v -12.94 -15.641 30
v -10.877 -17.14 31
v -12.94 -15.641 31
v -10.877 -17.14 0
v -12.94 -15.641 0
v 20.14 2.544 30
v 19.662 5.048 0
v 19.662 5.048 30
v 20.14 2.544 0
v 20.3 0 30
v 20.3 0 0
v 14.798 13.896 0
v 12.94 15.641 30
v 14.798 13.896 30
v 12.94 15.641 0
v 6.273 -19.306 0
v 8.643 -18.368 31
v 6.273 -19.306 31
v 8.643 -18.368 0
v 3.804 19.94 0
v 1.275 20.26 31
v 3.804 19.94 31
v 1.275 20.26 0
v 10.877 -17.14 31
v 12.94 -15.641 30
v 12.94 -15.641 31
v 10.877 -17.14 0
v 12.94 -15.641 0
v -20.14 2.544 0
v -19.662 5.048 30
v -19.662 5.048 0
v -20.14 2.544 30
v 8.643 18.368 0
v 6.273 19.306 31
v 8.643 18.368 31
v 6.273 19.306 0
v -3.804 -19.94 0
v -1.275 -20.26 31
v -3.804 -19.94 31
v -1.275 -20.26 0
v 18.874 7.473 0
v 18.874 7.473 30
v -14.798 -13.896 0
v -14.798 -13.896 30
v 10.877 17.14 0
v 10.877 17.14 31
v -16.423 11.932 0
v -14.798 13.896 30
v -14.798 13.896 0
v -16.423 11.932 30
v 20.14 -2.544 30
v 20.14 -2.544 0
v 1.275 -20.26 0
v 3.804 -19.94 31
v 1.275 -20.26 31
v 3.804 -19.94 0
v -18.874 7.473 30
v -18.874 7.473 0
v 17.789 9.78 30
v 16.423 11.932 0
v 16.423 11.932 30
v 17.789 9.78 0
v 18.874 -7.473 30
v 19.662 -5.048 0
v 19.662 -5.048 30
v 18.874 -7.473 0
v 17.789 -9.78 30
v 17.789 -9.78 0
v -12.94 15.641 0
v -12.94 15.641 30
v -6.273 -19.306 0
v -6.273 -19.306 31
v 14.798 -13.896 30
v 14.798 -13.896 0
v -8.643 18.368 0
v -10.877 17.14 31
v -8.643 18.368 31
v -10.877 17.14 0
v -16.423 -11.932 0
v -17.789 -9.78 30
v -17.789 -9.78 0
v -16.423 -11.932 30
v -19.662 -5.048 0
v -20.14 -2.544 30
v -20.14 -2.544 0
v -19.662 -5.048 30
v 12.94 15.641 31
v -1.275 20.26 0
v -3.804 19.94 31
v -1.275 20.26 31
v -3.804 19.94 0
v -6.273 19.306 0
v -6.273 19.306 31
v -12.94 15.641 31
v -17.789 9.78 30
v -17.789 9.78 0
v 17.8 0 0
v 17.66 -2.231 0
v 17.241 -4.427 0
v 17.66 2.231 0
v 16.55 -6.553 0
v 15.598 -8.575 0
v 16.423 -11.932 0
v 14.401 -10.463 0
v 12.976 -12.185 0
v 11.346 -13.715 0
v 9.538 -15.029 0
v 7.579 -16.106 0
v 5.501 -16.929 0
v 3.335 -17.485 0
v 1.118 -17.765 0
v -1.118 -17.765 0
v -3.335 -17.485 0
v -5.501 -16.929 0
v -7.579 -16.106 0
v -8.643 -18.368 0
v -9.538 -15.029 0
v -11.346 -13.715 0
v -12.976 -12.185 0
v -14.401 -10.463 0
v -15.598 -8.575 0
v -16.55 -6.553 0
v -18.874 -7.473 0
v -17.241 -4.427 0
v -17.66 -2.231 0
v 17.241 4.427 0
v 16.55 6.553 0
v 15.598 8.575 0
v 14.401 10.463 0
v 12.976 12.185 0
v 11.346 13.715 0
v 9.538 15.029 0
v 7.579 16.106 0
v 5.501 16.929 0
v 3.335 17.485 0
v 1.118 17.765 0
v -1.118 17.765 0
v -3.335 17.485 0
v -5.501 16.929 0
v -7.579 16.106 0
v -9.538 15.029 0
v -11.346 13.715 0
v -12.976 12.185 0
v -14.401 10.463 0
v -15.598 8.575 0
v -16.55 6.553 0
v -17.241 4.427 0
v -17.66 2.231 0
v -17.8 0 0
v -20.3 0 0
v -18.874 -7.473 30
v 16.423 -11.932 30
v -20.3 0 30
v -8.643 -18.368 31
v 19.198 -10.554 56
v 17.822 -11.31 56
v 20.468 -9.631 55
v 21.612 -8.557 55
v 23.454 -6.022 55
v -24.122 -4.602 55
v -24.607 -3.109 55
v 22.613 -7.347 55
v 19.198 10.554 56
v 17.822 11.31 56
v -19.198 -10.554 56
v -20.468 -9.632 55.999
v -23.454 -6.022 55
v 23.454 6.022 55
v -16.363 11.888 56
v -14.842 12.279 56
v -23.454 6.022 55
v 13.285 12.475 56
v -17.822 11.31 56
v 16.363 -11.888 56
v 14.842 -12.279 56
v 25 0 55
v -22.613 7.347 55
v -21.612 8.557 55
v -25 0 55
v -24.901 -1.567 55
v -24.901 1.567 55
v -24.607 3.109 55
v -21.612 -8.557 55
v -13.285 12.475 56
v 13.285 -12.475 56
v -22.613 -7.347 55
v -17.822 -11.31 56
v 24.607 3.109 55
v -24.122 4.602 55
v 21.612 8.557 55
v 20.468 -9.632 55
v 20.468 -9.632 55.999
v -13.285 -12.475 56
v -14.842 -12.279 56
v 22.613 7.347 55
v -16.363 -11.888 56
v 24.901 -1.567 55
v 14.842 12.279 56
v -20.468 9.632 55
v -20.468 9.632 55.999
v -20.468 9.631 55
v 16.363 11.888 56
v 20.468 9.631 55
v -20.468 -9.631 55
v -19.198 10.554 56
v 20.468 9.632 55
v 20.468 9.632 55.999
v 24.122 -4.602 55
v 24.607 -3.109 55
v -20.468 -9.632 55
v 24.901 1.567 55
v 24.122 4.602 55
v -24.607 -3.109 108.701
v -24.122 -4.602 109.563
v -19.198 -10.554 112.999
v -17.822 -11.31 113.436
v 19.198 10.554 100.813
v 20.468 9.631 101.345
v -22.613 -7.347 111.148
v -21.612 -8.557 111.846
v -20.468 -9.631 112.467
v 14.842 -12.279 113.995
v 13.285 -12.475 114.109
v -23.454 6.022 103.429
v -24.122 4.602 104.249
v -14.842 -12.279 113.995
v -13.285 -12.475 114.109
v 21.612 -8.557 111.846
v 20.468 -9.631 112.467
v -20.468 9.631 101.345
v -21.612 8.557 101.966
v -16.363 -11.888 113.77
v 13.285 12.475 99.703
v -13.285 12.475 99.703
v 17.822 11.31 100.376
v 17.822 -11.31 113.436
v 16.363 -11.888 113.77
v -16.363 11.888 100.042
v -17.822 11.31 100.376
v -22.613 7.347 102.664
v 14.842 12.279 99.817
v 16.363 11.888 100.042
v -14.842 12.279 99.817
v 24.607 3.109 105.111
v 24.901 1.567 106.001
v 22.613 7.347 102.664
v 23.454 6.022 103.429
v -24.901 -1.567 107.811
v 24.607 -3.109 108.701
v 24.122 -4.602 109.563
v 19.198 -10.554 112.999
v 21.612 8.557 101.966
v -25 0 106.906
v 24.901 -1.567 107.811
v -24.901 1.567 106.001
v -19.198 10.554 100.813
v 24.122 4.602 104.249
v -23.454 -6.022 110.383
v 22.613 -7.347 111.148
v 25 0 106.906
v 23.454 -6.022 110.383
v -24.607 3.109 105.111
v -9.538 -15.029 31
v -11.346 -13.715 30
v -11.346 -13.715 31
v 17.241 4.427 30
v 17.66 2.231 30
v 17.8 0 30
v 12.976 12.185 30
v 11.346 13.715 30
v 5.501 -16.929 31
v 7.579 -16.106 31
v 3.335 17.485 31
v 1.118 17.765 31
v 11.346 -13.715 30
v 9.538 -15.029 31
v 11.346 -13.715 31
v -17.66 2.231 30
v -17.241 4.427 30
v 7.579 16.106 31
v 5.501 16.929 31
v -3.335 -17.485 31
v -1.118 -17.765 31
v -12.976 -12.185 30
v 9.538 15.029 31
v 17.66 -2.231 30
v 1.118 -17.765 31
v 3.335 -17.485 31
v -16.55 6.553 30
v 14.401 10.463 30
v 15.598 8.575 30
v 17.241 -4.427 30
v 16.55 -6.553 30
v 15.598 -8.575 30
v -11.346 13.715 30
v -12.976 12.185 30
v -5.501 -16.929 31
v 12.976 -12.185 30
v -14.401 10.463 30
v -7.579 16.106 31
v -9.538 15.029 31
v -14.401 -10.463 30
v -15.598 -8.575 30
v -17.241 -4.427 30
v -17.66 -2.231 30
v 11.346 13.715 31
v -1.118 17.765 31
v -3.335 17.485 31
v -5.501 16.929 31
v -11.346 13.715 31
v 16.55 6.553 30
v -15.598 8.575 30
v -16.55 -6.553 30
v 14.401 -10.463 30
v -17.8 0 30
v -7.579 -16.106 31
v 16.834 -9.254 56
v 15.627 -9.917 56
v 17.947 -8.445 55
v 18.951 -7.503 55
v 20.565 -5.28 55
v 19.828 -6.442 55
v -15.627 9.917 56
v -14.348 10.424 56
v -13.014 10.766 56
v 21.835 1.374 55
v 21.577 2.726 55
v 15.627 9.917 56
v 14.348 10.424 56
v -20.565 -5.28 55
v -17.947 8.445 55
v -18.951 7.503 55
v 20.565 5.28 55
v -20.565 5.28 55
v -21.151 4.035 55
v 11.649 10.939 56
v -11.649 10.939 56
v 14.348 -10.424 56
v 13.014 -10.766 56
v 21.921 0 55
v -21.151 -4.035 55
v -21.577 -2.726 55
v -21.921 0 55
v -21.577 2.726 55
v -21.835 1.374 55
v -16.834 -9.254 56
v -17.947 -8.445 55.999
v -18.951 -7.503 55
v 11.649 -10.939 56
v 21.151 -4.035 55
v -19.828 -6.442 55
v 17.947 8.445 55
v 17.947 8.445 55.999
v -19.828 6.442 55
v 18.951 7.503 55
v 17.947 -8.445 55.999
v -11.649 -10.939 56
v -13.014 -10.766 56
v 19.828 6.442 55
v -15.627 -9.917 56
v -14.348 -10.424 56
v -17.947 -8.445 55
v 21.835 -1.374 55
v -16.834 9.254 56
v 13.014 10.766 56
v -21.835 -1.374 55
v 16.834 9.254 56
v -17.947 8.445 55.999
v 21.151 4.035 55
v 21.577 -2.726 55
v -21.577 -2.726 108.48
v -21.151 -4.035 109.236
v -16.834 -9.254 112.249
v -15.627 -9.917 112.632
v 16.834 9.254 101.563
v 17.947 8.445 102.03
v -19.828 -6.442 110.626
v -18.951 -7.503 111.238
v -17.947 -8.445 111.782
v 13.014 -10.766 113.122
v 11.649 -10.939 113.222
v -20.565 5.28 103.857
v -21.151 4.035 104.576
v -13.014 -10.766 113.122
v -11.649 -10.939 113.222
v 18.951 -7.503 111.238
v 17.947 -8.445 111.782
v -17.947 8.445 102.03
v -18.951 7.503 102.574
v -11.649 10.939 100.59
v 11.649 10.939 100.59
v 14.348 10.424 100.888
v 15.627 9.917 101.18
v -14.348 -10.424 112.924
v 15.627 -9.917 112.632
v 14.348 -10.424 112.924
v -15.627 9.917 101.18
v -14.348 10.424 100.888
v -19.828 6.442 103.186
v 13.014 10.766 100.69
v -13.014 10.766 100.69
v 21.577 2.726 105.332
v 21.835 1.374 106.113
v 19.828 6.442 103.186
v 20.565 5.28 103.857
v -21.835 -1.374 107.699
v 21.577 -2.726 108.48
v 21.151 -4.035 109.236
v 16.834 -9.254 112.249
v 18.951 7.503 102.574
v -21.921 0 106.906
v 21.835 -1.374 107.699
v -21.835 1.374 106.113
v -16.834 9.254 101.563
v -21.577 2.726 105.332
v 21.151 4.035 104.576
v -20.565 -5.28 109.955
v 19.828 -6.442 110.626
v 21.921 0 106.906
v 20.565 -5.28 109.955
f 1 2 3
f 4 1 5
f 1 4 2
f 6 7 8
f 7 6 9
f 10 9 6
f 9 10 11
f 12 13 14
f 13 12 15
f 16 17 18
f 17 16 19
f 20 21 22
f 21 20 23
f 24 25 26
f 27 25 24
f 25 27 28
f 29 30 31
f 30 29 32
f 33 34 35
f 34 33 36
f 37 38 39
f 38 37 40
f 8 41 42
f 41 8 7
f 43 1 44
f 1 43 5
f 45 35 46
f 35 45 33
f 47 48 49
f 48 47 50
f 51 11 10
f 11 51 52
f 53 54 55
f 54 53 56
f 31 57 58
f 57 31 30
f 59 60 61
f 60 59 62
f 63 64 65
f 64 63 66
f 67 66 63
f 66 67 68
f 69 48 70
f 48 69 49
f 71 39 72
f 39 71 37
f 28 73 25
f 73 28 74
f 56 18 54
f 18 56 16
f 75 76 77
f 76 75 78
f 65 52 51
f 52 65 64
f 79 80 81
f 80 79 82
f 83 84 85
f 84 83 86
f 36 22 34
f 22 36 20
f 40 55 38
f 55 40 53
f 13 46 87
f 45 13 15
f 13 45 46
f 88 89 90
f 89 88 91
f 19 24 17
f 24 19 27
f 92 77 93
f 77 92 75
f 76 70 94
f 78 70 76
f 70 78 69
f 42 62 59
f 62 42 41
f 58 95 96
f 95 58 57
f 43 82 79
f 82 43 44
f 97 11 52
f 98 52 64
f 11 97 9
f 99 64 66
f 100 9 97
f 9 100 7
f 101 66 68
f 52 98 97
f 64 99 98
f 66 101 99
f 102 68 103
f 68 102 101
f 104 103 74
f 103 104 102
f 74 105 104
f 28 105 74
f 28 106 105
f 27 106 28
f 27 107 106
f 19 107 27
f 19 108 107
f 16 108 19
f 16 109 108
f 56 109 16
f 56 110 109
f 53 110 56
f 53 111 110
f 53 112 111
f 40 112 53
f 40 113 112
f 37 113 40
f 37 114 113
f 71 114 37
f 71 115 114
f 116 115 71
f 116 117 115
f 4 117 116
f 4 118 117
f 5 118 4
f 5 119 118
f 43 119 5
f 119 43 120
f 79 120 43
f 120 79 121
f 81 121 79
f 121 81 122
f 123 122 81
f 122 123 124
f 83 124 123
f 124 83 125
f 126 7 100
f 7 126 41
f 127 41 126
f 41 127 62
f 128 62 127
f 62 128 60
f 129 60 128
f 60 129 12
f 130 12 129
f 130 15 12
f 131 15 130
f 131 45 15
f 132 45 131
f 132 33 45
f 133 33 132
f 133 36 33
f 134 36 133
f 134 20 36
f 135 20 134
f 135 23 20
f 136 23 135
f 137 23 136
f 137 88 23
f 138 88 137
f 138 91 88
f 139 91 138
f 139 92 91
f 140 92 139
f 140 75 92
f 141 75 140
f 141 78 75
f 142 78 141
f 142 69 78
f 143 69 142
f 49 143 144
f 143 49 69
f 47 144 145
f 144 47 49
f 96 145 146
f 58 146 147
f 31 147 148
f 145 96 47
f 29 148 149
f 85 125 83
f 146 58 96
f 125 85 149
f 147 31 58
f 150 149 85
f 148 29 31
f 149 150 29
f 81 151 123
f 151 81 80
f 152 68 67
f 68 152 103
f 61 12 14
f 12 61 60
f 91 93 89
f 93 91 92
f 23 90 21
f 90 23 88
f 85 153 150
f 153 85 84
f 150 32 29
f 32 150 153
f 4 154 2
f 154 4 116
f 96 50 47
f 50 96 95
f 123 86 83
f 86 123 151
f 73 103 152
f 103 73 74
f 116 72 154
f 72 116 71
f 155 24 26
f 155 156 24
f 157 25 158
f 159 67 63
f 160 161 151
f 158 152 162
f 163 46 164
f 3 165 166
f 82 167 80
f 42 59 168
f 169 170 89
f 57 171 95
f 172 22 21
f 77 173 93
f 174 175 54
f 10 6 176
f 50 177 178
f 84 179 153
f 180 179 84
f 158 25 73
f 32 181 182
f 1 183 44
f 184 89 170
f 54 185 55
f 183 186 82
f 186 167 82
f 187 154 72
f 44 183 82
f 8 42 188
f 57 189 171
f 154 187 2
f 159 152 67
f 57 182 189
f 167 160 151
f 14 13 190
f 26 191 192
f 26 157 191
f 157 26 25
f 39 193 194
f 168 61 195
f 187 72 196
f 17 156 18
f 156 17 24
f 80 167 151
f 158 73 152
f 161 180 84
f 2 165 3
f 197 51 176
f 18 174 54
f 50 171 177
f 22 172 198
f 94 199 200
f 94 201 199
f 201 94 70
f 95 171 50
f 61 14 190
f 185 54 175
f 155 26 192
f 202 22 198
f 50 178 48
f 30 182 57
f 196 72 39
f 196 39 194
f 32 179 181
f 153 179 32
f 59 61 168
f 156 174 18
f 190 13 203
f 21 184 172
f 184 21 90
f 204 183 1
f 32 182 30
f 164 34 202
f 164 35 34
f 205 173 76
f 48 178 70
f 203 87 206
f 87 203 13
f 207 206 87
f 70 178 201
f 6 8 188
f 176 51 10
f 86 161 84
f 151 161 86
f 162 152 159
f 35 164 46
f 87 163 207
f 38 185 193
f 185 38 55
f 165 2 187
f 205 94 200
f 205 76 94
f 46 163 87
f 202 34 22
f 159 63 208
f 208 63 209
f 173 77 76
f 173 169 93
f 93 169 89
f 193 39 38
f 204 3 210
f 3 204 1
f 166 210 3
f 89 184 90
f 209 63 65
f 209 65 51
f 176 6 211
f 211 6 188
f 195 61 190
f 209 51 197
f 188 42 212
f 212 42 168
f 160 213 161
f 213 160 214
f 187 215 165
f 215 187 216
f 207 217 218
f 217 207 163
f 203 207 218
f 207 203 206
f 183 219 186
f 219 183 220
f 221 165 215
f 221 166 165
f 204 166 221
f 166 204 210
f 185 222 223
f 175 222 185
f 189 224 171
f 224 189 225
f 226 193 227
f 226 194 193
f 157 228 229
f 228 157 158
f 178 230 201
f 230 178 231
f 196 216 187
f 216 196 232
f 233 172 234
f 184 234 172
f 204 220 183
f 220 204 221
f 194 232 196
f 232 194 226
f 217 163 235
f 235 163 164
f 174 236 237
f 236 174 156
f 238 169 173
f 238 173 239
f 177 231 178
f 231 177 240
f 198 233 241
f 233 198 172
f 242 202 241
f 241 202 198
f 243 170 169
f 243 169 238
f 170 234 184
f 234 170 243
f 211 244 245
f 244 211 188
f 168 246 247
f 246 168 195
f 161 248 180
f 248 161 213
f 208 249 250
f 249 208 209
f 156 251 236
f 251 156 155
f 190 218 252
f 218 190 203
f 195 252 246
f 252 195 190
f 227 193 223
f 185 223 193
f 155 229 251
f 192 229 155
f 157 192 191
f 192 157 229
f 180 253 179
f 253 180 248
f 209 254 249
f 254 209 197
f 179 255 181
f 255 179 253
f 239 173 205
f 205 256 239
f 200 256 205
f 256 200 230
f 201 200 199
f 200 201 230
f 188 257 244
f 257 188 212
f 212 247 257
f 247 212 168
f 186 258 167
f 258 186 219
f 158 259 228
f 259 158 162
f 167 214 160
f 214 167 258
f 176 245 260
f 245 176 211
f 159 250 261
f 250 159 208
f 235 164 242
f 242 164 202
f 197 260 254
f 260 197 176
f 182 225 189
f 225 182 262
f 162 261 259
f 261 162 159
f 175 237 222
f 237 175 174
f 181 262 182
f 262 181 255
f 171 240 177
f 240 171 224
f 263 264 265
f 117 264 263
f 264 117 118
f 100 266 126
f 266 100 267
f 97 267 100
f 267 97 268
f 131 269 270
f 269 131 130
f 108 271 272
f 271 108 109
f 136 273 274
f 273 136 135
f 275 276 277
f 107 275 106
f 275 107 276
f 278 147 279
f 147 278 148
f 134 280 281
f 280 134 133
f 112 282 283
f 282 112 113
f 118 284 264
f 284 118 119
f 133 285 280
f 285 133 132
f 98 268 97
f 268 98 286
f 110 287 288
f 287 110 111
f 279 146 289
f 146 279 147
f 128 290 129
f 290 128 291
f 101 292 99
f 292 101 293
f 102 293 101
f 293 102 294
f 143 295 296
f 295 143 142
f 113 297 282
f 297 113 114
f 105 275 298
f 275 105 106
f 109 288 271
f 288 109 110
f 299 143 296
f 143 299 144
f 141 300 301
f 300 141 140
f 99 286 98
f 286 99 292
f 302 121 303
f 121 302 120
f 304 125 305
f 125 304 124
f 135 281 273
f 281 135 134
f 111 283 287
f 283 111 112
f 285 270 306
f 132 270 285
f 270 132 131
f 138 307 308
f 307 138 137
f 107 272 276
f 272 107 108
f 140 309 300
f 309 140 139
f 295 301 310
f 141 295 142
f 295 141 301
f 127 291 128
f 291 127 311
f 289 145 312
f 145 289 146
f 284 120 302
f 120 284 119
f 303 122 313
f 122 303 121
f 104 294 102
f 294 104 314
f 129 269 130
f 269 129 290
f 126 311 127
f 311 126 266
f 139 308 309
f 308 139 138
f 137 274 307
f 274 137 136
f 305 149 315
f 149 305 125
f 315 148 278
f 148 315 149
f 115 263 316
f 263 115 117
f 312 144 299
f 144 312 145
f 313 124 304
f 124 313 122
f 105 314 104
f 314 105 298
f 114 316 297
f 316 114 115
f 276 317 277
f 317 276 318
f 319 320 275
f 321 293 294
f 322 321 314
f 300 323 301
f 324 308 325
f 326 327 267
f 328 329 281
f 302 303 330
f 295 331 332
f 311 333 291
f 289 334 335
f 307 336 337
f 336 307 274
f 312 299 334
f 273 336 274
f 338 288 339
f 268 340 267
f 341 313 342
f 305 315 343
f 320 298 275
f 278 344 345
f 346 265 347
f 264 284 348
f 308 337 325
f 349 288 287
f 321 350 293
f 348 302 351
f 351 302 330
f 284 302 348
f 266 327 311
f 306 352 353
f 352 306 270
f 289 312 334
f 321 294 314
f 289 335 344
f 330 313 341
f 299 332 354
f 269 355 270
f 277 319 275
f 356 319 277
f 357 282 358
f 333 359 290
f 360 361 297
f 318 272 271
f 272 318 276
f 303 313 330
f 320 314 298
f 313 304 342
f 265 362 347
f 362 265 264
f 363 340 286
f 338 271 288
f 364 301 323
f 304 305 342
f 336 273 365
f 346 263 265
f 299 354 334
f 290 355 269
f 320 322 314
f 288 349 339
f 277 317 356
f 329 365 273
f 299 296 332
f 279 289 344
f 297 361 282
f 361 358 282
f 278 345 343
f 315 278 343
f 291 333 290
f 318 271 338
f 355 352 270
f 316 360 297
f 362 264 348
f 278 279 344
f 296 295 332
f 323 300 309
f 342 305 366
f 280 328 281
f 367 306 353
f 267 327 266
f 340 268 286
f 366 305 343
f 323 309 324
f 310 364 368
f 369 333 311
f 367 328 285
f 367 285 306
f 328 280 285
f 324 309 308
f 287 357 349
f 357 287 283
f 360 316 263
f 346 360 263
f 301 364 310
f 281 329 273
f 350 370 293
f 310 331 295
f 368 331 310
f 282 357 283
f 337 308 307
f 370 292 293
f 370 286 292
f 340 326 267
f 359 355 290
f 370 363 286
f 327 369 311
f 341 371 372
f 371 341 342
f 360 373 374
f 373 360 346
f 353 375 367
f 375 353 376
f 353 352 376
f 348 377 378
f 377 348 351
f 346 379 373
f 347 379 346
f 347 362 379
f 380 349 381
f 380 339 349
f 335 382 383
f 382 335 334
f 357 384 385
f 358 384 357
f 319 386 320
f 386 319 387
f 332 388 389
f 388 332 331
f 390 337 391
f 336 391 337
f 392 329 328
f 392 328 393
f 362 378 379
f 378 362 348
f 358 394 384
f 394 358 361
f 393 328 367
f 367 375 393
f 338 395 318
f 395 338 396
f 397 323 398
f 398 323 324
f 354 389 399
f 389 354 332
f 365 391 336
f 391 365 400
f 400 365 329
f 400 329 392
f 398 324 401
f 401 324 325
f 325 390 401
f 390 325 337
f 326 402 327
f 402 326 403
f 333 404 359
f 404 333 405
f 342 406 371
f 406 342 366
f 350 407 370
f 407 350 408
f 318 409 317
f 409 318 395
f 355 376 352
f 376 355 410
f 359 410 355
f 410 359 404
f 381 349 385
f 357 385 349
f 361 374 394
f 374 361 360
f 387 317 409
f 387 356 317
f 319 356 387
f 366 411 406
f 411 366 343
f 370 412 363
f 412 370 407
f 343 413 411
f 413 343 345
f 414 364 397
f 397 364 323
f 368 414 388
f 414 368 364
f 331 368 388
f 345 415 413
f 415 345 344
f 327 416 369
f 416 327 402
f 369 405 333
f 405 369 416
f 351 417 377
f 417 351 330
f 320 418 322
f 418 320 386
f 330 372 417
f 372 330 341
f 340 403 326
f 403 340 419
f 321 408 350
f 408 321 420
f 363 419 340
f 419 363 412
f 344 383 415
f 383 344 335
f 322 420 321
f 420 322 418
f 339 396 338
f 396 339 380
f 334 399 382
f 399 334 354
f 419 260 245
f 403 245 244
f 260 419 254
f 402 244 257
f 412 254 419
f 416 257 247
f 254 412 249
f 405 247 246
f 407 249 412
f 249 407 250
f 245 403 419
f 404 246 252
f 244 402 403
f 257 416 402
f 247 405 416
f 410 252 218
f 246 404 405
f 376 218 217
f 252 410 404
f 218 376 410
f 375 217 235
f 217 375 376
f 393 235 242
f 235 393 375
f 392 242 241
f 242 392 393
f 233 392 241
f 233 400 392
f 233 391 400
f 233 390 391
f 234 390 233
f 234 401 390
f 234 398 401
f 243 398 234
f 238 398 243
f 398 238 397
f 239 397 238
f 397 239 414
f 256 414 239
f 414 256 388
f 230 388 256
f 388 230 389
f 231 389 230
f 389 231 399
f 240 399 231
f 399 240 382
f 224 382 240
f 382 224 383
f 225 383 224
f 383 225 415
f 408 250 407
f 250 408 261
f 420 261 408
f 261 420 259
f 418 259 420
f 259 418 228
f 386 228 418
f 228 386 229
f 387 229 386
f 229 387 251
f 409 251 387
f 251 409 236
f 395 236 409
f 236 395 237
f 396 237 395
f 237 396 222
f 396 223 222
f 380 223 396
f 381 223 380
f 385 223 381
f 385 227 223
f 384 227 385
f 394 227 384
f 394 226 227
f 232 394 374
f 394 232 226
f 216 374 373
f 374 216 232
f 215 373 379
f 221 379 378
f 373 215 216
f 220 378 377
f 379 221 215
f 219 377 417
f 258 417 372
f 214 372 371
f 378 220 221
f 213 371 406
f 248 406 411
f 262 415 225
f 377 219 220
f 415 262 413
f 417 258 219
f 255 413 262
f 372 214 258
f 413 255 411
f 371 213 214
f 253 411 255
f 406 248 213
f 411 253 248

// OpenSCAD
$fn = 50;

base_height = 30;
middle_height = 25;
top_height = 60;
wall_thickness = 2.5;
base_diameter = 35.6;
tip_width = 45;
tip_thickness = 20;

module tip() {
  tip_radius = (tip_thickness + (wall_thickness * 2)) / 2;
  translate([tip_radius - ((tip_width + (wall_thickness * 2)) / 2), 0, base_height + middle_height]) 
  hull() {
    cylinder(h = top_height, r = tip_radius);

    translate([tip_width + (wall_thickness * 2) - (tip_radius * 2), 0, 0]) 
    cylinder(h = top_height, r = tip_radius);
  }
}

module whole_part() {
  // Base
  base_radius = (base_diameter + (wall_thickness * 2)) / 2;
  cylinder(h = base_height, r = base_radius);

  // Middle
  hull() {
    translate([0, 0, base_height]) 
    linear_extrude(1)
    circle(base_radius);

    translate([0, 0, base_height + middle_height])
    linear_extrude(1)
    projection()
    tip();
  }

  // Top
  tip();
}

difference() {
  whole_part();

  // Top cutout
  translate([0, 10, base_height + middle_height + top_height -10 + 25])
  rotate([-30, 0, 0])
  cube(50, center = true);

  scale([base_diameter / (base_diameter + (wall_thickness * 2)),
        base_diameter / (base_diameter + (wall_thickness * 2)),
        1])
  whole_part();
}
